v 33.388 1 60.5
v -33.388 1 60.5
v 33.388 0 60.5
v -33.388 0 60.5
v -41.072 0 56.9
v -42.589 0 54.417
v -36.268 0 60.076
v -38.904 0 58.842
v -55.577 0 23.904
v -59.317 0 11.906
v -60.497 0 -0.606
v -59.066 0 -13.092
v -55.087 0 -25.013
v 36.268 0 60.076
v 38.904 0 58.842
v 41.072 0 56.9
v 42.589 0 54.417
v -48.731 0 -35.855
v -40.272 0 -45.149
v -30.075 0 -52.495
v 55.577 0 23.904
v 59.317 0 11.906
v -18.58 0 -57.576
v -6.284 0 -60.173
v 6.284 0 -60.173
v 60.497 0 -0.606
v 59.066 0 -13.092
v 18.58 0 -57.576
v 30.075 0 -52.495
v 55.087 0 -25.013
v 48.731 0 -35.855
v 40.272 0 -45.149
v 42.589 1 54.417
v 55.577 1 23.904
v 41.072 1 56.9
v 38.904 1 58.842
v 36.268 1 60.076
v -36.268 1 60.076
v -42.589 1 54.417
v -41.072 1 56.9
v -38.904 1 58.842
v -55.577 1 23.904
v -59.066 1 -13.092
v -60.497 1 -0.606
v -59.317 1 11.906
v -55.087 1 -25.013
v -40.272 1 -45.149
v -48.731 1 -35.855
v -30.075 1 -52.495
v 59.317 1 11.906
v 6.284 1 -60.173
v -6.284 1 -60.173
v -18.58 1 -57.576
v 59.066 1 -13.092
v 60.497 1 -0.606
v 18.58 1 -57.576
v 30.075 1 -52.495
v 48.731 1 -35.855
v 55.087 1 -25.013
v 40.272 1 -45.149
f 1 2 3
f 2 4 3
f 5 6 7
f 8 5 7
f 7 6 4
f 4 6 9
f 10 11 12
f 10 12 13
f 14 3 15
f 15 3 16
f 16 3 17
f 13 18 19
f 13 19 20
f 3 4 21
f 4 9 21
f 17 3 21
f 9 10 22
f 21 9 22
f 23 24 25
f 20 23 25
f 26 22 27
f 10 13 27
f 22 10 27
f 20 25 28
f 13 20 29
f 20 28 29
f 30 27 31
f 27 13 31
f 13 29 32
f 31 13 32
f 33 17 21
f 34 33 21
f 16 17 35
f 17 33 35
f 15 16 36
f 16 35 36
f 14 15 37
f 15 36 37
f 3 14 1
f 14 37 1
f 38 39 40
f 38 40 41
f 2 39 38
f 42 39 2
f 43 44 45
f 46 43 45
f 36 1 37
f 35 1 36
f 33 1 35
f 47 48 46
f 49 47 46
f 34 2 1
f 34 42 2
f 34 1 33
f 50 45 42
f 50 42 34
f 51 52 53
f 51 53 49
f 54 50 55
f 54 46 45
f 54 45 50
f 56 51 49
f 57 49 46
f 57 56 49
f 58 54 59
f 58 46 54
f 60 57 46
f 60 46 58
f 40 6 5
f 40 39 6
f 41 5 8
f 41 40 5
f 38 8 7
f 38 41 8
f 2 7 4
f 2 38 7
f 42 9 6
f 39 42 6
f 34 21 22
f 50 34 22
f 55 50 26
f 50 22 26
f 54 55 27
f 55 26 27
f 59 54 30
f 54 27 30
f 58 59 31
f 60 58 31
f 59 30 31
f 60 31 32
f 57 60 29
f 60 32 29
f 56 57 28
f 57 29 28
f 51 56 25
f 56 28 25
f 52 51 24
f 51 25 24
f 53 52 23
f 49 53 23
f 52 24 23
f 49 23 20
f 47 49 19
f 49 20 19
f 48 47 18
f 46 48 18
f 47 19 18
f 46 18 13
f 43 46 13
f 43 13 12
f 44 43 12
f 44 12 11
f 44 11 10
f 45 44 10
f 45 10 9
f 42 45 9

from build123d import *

# Parameters (mm, degrees)
SKETCH1_R           = 60.5
BOSS_EXTRUDE1_DEPTH = 1
BOSS_EXTRUDE2_START = -1
BOSS_EXTRUDE2_DEPTH = 1
FILLET1_R           = 10


with BuildPart() as part:
    # Sketch1 → Boss-Extrude1 (new body)
    with BuildSketch(Plane(origin=(0, 0, 0), x_dir=(1, 0, 0), z_dir=(0, 1, 0))):
        with Locations(Location((0, 0, 0), (0, 0, 270))):
            Circle(SKETCH1_R)
    extrude(amount=BOSS_EXTRUDE1_DEPTH)

    # Sketch7 → Boss-Extrude2 (add)
    with BuildSketch(Plane(origin=(0, 1, 0), x_dir=(1, 0, 0), z_dir=(0, 1, 0)).offset(BOSS_EXTRUDE2_START)):
        with BuildLine():
            Line((-55.577310907, -23.904236284), (-40, -60.5))
            Line((-40, -60.5), (2.22e-07, -60.5))
            ThreePointArc((2.22e-07, -60.5), (-33.271937819, -50.529478067), (-55.577310907, -23.904236284))
        make_face()
        with BuildLine():
            ThreePointArc((55.577310907, -23.904236284), (33.271938005, -50.529477945), (2.22e-07, -60.5))
            Line((2.22e-07, -60.5), (40, -60.5))
            Line((40, -60.5), (55.577310907, -23.904236284))
        make_face()
    extrude(amount=BOSS_EXTRUDE2_DEPTH)

    # Fillet1
    fillet1_edges = [part.edges().sort_by_distance(p)[0] for p in [
        (40, 0.5, 60.5),
        (-40, 0.5, 60.5),
    ]]
    fillet(fillet1_edges, radius=FILLET1_R)


solid = part.part
